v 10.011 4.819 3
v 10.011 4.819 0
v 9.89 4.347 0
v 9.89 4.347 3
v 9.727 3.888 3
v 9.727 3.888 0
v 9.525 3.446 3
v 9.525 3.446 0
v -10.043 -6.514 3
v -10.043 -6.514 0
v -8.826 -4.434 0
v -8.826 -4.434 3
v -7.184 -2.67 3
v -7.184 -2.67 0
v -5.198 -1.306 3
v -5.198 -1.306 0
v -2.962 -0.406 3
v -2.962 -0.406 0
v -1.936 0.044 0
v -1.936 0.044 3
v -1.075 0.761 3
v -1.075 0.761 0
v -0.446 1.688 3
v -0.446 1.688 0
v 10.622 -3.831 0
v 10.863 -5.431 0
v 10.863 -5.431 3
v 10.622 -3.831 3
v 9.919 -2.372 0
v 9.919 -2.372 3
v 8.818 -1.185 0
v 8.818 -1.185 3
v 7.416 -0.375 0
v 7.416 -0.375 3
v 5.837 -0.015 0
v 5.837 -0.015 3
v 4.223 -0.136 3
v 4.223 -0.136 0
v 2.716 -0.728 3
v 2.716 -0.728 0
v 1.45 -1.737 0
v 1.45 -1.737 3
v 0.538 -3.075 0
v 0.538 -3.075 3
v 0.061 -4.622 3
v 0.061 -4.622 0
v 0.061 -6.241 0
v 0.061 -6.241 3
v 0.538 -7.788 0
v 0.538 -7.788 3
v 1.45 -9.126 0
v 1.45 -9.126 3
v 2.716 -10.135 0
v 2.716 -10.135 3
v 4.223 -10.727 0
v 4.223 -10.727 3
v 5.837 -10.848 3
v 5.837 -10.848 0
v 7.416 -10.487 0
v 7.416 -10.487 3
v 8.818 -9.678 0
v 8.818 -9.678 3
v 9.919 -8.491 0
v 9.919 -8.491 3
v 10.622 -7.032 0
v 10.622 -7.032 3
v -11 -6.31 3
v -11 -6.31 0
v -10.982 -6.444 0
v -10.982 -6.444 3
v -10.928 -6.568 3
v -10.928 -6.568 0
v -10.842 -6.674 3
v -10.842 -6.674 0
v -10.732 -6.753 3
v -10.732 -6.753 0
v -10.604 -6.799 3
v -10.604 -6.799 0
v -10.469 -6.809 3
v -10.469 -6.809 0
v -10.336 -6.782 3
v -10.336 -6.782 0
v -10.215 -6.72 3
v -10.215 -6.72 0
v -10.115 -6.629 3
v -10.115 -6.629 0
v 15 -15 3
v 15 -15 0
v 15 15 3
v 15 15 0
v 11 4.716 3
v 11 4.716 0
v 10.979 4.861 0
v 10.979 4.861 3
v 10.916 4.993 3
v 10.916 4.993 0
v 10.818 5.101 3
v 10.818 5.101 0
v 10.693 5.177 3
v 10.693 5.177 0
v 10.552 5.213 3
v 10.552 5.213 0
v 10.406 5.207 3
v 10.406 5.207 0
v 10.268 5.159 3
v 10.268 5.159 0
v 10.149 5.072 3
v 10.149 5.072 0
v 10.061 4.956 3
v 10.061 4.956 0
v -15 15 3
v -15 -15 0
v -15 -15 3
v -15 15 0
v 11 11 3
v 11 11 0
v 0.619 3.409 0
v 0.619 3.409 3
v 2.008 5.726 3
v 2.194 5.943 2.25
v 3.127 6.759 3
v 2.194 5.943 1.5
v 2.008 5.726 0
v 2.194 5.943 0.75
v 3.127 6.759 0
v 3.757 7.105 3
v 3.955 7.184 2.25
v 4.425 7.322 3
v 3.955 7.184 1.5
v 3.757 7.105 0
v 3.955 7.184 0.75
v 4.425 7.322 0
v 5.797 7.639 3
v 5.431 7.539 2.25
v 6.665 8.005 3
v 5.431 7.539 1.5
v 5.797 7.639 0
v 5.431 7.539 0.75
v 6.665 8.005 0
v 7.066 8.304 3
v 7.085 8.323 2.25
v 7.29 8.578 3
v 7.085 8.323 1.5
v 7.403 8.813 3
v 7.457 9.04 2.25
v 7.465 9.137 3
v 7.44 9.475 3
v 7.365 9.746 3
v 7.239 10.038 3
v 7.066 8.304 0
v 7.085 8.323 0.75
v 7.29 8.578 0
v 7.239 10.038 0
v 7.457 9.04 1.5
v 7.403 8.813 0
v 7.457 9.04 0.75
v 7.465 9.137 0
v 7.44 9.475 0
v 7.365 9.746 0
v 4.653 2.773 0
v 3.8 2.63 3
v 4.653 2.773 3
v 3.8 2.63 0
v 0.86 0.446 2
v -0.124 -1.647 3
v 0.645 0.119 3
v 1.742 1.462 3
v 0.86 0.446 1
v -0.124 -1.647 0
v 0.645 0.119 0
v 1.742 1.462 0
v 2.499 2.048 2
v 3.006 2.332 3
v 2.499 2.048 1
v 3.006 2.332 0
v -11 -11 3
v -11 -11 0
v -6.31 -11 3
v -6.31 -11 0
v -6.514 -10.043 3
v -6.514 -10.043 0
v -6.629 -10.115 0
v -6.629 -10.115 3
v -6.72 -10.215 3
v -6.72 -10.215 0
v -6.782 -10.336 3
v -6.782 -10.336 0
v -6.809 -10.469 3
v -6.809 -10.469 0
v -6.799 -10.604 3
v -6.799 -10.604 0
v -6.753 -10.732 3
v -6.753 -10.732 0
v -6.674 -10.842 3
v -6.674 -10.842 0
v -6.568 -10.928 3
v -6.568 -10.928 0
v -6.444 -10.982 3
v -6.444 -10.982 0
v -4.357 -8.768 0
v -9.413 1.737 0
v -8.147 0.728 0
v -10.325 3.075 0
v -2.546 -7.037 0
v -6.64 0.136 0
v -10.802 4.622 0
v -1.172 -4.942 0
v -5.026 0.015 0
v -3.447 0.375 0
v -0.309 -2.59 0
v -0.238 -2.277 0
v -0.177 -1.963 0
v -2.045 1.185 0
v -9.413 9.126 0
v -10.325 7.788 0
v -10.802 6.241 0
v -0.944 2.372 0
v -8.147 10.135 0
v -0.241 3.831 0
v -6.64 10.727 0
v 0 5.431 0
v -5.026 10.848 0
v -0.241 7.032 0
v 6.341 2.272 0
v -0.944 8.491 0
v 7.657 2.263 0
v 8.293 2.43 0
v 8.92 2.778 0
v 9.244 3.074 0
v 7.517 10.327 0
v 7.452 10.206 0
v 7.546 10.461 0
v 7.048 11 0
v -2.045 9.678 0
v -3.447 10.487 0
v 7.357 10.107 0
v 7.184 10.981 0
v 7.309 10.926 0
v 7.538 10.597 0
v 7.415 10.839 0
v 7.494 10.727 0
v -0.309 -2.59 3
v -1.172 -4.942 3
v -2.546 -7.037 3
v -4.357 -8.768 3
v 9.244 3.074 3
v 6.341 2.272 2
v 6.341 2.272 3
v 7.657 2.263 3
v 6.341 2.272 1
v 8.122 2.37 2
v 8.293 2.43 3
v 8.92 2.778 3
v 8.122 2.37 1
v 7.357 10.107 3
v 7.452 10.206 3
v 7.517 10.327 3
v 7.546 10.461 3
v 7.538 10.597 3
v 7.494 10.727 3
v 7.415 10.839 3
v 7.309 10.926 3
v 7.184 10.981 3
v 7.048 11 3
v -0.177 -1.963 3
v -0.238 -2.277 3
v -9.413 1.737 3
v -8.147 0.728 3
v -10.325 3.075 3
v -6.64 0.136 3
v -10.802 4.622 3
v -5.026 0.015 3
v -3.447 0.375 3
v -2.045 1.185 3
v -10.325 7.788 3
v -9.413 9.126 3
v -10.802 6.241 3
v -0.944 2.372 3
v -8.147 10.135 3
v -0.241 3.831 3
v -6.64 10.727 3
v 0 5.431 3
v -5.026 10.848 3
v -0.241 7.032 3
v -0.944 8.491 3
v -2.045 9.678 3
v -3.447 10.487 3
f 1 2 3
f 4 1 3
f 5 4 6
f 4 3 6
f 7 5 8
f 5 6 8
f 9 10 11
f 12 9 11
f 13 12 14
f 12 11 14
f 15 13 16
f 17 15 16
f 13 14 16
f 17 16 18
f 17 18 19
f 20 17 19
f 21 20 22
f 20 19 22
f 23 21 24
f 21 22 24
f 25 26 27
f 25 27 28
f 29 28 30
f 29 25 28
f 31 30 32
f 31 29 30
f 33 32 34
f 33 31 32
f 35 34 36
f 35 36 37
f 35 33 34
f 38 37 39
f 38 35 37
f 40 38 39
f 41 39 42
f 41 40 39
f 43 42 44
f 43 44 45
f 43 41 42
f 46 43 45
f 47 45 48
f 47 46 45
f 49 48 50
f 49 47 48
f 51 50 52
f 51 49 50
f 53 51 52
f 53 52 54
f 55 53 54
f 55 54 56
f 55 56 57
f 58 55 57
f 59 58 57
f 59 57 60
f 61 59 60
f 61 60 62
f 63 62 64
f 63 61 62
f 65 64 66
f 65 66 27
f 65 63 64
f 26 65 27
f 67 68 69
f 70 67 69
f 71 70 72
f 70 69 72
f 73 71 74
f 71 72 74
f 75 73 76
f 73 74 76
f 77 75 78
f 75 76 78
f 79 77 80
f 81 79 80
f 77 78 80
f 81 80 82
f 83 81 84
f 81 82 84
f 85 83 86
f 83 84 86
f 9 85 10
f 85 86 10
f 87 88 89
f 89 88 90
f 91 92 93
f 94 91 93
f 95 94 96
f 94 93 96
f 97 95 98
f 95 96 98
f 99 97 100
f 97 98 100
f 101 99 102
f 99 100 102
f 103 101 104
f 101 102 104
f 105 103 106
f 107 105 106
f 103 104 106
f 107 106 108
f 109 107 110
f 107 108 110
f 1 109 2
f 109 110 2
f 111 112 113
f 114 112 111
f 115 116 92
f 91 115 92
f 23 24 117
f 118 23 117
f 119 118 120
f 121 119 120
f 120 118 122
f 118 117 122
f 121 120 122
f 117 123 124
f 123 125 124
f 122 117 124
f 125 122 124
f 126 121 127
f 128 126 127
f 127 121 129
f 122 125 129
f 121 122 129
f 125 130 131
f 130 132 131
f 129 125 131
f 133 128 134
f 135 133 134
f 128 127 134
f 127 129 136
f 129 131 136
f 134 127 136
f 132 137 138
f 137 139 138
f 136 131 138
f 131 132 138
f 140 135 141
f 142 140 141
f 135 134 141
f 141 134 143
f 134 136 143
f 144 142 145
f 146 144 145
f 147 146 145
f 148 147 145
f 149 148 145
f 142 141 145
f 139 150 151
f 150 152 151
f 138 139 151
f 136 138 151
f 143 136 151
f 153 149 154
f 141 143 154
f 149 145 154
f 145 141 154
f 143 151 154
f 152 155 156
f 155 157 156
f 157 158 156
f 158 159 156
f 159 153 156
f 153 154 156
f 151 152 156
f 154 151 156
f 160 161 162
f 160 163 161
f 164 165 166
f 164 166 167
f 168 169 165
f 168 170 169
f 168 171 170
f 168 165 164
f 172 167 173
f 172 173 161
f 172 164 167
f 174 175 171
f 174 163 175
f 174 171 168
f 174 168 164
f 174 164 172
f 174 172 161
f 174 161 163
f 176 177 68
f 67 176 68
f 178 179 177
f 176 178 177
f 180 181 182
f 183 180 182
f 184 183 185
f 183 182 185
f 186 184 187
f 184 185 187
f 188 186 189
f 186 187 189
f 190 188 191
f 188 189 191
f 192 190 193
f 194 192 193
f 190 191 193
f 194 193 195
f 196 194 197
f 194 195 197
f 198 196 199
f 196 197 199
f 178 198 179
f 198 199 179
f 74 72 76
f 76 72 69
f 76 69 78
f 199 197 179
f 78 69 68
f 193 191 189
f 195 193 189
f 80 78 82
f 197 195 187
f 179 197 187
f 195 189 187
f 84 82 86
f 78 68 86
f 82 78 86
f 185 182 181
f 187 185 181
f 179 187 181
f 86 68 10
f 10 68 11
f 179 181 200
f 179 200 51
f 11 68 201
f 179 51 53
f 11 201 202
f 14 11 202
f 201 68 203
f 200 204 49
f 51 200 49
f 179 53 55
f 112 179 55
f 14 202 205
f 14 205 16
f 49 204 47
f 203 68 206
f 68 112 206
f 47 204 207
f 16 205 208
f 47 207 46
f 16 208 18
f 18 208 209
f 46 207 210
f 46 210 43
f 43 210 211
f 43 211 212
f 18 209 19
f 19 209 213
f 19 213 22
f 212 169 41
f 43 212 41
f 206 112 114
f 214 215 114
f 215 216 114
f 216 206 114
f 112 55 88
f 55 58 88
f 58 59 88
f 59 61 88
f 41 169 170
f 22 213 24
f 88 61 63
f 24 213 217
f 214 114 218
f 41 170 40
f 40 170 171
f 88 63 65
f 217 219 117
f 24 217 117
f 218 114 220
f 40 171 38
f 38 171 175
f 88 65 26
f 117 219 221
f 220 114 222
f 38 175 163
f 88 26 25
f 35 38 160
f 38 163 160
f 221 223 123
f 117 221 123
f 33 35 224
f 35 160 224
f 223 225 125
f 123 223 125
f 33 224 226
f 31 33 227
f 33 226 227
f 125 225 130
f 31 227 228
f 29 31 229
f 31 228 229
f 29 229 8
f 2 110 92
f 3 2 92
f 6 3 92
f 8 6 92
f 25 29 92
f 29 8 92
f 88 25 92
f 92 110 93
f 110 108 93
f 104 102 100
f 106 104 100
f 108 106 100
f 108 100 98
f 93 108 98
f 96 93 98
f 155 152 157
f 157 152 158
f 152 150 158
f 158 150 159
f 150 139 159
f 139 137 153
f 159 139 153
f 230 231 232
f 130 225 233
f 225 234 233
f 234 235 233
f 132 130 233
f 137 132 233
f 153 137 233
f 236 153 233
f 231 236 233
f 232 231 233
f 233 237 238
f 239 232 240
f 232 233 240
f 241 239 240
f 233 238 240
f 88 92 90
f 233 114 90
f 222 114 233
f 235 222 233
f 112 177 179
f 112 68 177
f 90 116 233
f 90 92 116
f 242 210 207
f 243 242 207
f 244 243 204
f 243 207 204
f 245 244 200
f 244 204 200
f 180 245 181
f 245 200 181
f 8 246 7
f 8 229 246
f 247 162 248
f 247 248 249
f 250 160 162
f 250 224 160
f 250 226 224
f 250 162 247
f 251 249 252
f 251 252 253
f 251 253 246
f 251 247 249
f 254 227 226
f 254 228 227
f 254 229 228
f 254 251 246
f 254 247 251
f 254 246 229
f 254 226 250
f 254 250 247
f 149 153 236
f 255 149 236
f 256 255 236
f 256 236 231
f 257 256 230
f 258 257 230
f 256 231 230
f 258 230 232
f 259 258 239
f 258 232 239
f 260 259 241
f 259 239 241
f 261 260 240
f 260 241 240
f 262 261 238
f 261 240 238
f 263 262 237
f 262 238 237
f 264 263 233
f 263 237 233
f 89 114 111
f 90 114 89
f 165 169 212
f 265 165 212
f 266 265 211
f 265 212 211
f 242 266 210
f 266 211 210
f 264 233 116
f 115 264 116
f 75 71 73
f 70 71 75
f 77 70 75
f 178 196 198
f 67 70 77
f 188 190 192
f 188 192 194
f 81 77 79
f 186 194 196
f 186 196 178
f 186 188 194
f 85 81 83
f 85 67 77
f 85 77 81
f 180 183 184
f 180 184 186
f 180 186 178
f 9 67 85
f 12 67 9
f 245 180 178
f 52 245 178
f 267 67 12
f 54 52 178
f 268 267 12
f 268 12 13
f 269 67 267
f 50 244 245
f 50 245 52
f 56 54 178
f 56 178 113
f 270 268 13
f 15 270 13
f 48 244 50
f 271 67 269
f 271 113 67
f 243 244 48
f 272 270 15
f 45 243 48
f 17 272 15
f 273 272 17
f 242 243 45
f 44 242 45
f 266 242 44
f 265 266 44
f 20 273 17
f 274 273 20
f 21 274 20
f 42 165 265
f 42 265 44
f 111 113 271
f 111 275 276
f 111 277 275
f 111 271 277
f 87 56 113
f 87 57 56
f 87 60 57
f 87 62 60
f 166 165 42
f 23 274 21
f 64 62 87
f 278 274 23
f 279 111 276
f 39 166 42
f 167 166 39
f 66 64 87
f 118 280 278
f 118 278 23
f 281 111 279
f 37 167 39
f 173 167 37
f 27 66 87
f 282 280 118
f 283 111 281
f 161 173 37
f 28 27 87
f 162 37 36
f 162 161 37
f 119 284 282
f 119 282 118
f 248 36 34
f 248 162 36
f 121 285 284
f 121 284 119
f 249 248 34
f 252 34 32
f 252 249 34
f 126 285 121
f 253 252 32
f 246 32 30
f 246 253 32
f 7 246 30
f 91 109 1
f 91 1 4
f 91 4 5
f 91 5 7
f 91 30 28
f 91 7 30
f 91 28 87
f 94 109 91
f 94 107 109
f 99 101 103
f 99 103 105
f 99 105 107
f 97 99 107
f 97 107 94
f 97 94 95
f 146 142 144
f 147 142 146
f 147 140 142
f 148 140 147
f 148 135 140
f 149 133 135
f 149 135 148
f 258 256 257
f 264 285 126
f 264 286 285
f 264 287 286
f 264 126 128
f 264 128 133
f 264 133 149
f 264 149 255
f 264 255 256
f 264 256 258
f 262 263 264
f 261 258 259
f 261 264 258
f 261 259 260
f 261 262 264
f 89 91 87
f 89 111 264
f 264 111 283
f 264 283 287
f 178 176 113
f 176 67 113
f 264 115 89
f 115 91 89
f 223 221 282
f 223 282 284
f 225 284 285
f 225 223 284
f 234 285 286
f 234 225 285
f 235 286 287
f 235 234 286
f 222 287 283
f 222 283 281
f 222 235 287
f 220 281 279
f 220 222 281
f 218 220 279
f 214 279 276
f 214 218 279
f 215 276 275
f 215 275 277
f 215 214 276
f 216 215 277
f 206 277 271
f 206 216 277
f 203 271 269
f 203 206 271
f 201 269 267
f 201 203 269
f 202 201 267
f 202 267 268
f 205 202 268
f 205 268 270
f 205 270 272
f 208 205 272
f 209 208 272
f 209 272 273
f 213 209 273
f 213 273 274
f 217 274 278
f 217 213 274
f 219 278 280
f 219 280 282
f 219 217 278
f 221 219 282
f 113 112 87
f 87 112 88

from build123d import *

# Parameters (mm, degrees)
CROQUIS1_W              = 30
CROQUIS1_H              = 30
CROQUIS1_R              = 5.43144852
SALIENTE_EXTRUIR1_DEPTH = 3


with BuildPart() as part:
    # Croquis1 → Saliente-Extruir1 (new body)
    with BuildSketch(Plane.XY):
        Rectangle(CROQUIS1_W, CROQUIS1_H)
        with Locations((5.43144852, -5.43144852)):
            Circle(CROQUIS1_R, mode=Mode.SUBTRACT)
        with BuildLine():
            Line((-11, -11), (-11, -6.30958424))
            ThreePointArc((-11, -6.30958424), (-10.604257207, -6.798593887), (-10.043478261, -6.51351536))
            ThreePointArc((-10.043478261, -6.51351536), (-7.184032198, -2.669953099), (-2.962030371, -0.40630489))
            ThreePointArc((-2.962030371, -0.40630489), (-1.479948679, 0.371768463), (-0.44603831, 1.688200624))
            add(Edge.make_bspline(
                [(-0.44603831, 1.688200624), (0.600161472, 2.997780482), (1.259535405, 5.412607882), (3.723491408, 7.268772296), (6.075005948, 7.554534112), (8.017011232, 8.499729242), (7.239010254, 10.03791357)],
                knots=[0, 0, 0, 0, 0.408369394, 0.584001697, 0.707826515, 1, 1, 1, 1], degree=3))
            ThreePointArc((7.239010254, 10.03791357), (7.538453023, 10.597357036), (7.048023, 11))
            Line((7.048023, 11), (11, 11))
            Line((11, 11), (11, 4.715933429))
            ThreePointArc((11, 4.715933429), (10.551626523, 5.213260989), (10.010661191, 4.8186346))
            ThreePointArc((10.010661191, 4.8186346), (9.813510438, 4.116058971), (9.524664361, 3.445947877))
            add(Edge.make_bspline(
                [(4.653277623, 2.773397026), (6.138085687, 2.096565381), (8.467088589, 1.756469214), (9.524664361, 3.445947877)],
                knots=[0, 0, 0, 0, 1, 1, 1, 1], degree=3))
            add(Edge.make_bspline(
                [(-0.124019497, -1.647133295), (0.48560807, 0.564599921), (2.28878007, 2.613788972), (4.653277623, 2.773397026)],
                knots=[0.123819996, 0.123819996, 0.123819996, 0.123819996, 1, 1, 1, 1], degree=3))
            ThreePointArc((-0.124019497, -1.647133295), (-0.206307312, -2.120424053), (-0.309181236, -2.589670665))
            ThreePointArc((-0.309181236, -2.589670665), (-2.545566455, -7.037226259), (-6.51351536, -10.043478261))
            ThreePointArc((-6.51351536, -10.043478261), (-6.798593887, -10.604257207), (-6.30958424, -11))
            Line((-6.30958424, -11), (-11, -11))
        make_face(mode=Mode.SUBTRACT)
        with Locations((-5.43144852, 5.43144852)):
            Circle(CROQUIS1_R, mode=Mode.SUBTRACT)
    extrude(amount=SALIENTE_EXTRUIR1_DEPTH)


solid = part.part
